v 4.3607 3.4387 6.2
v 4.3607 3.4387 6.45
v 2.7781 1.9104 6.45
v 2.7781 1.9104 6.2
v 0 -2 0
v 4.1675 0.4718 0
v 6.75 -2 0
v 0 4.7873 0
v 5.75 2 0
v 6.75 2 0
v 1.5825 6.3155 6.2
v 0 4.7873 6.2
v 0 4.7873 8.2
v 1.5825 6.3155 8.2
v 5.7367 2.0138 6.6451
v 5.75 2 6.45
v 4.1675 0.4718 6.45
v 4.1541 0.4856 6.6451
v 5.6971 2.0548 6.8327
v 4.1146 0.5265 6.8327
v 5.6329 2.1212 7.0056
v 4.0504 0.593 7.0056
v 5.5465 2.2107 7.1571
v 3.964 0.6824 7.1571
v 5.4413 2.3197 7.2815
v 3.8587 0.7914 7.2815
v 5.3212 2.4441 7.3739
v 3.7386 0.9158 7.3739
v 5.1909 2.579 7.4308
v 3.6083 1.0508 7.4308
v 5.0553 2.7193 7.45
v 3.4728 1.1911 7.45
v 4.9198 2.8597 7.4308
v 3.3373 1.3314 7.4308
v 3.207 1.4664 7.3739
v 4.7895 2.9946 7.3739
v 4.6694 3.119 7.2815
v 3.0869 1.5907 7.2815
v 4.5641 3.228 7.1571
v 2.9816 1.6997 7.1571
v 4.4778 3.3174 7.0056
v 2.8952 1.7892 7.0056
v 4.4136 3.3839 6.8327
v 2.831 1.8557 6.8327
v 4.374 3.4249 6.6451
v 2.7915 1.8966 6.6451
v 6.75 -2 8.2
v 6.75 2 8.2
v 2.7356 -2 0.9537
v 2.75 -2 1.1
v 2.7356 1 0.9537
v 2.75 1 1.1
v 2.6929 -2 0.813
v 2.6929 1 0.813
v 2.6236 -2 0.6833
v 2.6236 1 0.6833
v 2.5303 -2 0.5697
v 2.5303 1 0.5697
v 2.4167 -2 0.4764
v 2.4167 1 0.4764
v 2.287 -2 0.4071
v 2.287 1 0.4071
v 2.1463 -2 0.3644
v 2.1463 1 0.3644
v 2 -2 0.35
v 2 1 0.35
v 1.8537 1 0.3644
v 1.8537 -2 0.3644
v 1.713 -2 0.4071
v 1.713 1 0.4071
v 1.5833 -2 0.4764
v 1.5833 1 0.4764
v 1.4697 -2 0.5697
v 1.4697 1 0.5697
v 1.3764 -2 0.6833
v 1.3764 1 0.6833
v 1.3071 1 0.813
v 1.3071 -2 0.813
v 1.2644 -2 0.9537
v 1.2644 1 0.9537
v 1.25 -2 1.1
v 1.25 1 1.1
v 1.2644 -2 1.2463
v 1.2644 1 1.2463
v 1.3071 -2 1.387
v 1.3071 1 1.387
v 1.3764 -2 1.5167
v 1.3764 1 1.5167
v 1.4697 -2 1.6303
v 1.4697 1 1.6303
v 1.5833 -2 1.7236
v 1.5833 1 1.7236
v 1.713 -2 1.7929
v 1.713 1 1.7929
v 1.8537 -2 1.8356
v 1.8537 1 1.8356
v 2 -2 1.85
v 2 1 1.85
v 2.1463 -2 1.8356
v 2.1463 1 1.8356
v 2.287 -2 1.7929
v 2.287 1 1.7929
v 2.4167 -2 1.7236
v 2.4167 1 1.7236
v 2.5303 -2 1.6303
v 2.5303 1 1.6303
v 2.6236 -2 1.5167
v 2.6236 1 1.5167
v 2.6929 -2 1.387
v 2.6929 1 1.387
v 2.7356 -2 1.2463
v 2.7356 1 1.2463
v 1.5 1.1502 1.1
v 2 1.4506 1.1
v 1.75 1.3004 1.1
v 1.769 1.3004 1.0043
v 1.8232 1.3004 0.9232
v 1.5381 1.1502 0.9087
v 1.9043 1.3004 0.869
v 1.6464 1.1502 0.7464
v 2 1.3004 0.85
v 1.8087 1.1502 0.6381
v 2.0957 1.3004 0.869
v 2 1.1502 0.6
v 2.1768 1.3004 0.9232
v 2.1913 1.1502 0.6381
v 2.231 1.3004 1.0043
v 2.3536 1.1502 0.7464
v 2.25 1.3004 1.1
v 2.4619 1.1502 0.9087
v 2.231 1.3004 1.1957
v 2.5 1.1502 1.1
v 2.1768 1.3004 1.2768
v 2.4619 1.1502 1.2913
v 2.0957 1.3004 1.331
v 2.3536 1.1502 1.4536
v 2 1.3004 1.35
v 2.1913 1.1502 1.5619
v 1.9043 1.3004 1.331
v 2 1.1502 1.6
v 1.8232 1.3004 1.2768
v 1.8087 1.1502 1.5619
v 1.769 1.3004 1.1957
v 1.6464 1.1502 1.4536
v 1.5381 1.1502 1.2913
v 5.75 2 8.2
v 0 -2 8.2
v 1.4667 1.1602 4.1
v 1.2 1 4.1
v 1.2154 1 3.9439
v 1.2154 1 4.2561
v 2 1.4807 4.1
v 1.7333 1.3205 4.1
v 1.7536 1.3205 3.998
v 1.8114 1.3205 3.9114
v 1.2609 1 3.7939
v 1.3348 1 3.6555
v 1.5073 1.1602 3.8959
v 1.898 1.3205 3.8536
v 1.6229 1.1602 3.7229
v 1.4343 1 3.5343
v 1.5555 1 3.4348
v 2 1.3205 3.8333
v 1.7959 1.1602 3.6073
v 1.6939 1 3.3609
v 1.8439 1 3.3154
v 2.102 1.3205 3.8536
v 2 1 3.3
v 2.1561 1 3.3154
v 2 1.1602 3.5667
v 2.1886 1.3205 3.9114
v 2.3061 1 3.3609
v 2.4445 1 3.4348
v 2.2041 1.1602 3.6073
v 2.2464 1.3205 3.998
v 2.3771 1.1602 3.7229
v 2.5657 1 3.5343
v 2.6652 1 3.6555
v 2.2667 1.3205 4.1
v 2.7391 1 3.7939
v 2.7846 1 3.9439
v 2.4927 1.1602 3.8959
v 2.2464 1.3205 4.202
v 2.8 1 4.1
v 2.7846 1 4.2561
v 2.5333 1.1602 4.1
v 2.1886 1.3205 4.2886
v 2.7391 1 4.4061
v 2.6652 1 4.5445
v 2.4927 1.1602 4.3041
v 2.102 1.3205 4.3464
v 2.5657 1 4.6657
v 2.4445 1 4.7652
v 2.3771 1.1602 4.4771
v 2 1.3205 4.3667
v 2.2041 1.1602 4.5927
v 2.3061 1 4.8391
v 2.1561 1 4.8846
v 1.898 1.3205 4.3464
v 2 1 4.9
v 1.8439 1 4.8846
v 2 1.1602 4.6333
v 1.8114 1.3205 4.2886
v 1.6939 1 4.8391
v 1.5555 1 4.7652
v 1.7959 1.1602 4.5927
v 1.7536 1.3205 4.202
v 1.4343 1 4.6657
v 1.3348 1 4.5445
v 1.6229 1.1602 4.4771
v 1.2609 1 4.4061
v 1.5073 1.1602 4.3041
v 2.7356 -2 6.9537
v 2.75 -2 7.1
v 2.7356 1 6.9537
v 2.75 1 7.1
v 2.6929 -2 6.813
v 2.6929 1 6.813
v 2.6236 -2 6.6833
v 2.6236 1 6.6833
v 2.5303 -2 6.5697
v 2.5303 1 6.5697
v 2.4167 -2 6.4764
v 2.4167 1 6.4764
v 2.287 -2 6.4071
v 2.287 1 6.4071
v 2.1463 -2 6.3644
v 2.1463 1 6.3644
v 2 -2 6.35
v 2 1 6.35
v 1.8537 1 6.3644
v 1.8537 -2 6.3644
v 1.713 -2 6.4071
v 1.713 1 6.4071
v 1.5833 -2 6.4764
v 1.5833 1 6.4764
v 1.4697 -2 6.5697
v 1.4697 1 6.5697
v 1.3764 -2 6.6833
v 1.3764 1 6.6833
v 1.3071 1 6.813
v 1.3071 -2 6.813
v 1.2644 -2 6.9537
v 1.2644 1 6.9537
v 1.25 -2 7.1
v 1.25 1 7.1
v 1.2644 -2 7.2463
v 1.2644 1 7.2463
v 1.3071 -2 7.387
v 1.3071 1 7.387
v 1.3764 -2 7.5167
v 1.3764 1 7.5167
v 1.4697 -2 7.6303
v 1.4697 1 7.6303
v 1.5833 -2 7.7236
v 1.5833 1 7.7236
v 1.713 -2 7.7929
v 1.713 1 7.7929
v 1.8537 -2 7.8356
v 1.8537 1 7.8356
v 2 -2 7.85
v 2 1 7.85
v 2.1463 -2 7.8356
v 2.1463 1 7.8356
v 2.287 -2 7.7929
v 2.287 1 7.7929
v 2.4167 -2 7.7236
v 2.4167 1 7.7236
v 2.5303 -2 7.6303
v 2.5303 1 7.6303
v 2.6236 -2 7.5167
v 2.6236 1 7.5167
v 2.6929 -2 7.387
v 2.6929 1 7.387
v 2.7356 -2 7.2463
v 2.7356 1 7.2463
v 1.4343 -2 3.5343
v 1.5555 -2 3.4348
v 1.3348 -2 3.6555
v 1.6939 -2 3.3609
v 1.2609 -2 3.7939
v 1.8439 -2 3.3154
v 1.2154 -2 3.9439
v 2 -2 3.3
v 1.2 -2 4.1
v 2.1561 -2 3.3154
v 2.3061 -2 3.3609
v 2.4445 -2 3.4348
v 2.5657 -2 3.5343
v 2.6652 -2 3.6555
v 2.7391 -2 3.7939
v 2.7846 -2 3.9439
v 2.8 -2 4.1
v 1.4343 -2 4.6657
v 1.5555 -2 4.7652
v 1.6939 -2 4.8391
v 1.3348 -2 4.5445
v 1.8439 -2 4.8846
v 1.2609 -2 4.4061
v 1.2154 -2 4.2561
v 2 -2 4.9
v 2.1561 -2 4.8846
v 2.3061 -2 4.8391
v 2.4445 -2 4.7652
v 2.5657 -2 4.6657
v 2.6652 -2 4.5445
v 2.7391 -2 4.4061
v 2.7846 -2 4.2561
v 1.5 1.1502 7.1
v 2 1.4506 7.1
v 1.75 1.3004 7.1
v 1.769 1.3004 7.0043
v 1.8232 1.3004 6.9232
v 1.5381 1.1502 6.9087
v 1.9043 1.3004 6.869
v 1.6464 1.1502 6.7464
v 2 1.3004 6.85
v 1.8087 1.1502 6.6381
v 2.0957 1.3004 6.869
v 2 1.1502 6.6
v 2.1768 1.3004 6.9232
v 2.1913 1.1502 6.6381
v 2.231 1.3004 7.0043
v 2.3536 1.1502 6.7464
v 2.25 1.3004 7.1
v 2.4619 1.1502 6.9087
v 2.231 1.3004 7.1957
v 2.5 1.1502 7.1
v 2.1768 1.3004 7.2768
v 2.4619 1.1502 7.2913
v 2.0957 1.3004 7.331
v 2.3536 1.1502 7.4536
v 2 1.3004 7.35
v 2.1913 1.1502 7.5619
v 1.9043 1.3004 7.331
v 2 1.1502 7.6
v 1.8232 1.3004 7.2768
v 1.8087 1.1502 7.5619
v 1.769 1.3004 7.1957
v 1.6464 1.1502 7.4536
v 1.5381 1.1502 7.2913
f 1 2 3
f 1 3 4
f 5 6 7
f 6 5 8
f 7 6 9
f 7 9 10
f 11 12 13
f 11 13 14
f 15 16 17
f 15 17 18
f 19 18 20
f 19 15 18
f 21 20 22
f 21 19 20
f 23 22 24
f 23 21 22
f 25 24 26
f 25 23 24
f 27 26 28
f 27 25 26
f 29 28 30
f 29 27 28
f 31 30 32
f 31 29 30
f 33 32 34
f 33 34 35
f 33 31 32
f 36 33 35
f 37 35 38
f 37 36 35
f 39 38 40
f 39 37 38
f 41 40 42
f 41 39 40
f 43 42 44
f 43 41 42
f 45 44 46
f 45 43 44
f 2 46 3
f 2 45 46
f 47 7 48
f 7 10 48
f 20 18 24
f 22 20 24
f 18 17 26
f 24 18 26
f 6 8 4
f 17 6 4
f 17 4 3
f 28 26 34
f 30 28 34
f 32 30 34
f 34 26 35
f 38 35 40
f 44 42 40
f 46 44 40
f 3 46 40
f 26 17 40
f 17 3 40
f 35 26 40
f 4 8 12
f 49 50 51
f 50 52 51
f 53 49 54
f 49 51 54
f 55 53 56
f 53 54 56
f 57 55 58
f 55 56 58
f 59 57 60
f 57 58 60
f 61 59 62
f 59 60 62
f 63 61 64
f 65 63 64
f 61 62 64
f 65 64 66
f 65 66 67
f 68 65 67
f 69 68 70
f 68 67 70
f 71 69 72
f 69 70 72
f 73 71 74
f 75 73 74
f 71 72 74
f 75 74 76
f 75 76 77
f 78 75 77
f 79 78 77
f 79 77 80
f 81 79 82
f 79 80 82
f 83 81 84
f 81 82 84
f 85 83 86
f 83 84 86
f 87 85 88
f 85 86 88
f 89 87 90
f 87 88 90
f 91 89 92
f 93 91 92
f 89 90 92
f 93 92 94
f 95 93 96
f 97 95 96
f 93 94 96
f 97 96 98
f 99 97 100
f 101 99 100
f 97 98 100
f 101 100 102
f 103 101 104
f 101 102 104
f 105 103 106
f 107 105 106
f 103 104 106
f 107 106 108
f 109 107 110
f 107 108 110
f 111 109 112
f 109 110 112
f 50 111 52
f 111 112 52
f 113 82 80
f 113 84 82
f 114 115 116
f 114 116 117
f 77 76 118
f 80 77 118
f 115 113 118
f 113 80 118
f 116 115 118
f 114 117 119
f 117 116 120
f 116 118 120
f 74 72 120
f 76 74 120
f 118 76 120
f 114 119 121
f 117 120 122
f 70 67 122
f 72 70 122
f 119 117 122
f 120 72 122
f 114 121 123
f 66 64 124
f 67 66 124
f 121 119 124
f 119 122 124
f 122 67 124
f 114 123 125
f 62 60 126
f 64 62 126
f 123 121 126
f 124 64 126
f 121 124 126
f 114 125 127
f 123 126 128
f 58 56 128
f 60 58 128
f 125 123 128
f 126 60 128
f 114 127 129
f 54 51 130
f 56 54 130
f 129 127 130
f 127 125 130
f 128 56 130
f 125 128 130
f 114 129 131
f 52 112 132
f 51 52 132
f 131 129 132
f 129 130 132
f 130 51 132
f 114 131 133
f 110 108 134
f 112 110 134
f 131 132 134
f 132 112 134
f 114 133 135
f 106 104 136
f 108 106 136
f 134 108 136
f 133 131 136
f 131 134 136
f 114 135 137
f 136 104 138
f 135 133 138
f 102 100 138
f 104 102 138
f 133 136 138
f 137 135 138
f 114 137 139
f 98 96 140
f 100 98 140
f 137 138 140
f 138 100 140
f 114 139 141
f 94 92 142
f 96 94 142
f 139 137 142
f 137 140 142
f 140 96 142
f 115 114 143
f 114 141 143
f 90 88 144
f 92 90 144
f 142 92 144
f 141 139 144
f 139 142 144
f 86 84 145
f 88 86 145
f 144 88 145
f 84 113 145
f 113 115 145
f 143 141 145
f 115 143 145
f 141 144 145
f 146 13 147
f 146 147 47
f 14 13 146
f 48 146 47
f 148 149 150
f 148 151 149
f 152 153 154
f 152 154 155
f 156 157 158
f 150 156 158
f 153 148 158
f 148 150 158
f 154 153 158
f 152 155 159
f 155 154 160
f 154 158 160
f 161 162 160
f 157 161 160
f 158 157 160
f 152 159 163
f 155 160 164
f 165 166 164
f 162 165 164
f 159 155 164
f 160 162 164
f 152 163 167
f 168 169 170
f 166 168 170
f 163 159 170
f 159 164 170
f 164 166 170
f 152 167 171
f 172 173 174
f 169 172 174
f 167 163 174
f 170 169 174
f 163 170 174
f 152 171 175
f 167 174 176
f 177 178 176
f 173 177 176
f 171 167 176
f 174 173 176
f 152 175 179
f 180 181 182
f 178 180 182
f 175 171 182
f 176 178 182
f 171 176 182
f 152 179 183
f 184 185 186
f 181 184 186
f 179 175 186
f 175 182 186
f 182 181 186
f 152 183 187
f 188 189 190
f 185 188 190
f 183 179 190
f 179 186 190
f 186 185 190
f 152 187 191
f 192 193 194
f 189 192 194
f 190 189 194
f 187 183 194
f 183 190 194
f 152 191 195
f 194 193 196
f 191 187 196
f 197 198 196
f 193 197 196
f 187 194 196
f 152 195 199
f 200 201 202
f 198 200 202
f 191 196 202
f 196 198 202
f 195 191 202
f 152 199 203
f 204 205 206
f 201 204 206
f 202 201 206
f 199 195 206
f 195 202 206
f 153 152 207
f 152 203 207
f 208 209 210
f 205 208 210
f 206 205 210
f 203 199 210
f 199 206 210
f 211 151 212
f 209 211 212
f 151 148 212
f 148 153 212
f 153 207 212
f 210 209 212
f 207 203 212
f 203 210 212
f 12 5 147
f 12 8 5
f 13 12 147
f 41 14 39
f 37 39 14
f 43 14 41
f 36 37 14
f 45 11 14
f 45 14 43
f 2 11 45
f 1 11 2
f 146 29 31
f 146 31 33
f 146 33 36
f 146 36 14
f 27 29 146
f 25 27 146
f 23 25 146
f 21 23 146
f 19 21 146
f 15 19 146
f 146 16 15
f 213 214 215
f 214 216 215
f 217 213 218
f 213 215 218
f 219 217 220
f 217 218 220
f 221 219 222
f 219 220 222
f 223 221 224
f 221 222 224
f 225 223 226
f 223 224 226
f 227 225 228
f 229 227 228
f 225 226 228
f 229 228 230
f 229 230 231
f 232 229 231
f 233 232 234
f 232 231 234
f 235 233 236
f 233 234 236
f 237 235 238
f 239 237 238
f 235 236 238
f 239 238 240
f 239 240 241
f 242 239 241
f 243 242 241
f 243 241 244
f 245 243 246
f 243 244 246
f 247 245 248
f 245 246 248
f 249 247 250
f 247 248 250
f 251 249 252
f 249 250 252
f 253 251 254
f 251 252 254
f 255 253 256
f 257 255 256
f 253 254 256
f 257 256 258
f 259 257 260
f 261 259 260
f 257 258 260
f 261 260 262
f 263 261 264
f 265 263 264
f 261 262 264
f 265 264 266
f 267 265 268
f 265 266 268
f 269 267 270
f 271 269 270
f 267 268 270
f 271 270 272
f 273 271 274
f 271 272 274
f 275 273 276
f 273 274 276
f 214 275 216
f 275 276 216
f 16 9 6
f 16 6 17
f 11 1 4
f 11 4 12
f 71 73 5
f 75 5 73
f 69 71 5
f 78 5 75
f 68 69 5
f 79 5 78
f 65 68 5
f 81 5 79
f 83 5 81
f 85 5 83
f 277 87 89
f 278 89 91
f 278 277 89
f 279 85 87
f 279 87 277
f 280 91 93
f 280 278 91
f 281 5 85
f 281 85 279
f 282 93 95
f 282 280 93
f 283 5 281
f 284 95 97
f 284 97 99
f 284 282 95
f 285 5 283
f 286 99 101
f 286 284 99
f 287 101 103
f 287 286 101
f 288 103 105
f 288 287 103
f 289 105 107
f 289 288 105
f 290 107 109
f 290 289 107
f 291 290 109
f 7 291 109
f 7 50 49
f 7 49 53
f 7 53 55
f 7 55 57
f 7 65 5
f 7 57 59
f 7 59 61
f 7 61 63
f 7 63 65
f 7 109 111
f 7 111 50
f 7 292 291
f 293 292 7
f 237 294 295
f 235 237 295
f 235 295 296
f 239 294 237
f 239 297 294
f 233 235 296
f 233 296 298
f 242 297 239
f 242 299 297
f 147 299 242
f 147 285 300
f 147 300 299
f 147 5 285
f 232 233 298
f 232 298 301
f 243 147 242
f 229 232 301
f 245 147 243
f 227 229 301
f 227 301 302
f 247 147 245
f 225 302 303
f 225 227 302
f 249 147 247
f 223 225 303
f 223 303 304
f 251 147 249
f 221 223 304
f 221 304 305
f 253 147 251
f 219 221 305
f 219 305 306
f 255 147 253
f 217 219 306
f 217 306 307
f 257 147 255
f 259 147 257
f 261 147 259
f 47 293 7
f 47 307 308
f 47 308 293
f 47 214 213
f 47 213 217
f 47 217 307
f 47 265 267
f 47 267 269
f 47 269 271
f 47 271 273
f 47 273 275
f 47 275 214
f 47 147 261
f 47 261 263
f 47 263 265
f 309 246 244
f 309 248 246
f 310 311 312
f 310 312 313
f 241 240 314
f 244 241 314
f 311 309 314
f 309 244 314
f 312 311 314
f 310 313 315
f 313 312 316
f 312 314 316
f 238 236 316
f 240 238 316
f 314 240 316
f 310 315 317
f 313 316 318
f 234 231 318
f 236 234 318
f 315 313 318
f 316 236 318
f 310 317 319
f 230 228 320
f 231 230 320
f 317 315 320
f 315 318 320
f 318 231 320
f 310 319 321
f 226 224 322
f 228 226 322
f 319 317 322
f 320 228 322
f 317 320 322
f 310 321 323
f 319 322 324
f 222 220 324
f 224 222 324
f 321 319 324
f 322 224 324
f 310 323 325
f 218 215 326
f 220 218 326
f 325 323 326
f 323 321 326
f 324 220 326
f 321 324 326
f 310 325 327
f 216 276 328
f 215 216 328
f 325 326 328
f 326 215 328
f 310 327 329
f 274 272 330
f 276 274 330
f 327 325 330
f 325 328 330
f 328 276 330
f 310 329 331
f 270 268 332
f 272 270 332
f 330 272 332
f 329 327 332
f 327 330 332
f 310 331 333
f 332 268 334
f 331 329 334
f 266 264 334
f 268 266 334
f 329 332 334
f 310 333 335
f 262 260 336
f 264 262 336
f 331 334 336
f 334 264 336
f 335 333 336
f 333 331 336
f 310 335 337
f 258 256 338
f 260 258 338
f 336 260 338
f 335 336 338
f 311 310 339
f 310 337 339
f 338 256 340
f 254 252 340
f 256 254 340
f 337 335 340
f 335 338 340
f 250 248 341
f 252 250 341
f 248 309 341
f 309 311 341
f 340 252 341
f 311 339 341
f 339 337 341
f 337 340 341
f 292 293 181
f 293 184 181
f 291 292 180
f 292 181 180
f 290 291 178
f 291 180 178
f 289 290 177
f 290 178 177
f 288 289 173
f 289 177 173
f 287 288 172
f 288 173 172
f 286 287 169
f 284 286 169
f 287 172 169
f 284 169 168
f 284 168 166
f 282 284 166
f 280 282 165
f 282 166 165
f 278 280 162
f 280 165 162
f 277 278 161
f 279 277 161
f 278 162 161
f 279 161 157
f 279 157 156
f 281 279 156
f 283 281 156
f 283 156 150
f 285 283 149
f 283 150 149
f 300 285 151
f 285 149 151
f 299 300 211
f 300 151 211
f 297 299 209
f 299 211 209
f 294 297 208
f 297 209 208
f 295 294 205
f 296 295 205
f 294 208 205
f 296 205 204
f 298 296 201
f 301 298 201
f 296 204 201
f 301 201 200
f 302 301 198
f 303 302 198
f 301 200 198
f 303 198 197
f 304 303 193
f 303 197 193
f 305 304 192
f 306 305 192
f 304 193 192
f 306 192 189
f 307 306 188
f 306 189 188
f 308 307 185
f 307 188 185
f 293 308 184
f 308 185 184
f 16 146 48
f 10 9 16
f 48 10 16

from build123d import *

# Parameters (mm, degrees)
BOSS_EXTRUDE1_DEPTH       = 8.2
CUT_EXTRUDE1_DEPTH        = 2.2
SKETCH3_W                 = 6.75
SKETCH3_H                 = 8.2
BOSS_EXTRUDE2_DEPTH       = 2
F_1_5MM_DOWEL_HOLE1_D     = 1.5
F_1_5MM_DOWEL_HOLE1_DEPTH = 3
F_1_5MM_DOWEL_HOLE1_TIP   = 0.450645464
M2X0_4_TAPPED_HOLE1_D     = 1.6
M2X0_4_TAPPED_HOLE1_DEPTH = 3
M2X0_4_TAPPED_HOLE1_TIP   = 0.480688495


with BuildPart() as part:
    # Sketch1 → Boss-Extrude1 (new body)
    with BuildSketch(Plane.XY):
        Polygon((0, 0), (0, 4.787274917), (1.582547561, 6.315523332), (5.75, 2), (6.75, 2), (6.75, 0), align=None)
    extrude(amount=BOSS_EXTRUDE1_DEPTH)

    # Sketch2 → Cut-Extrude1 (cut)
    with BuildSketch(Plane(origin=(3.97472688, 3.838349131, 0), x_dir=(0, 0, -1), z_dir=(0.7193398, 0.69465837, 0))):
        with BuildLine():
            Line((0, 3.443677383), (0, -2.555606029))
            Line((0, -2.555606029), (-6.45, -2.555606029))
            ThreePointArc((-6.45, -2.555606029), (-7.45, -1.555606029), (-6.45, -0.555606029))
            Line((-6.45, -0.555606029), (-6.2, -0.555606029))
            Line((-6.2, -0.555606029), (-6.2, 3.443677383))
            Line((-6.2, 3.443677383), (0, 3.443677383))
        make_face()
    extrude(amount=-CUT_EXTRUDE1_DEPTH, mode=Mode.SUBTRACT)

    # Sketch3 → Boss-Extrude2 (add)
    with BuildSketch(Plane.XZ):
        with Locations((3.375, 4.1)):
            Rectangle(SKETCH3_W, SKETCH3_H)
    extrude(amount=BOSS_EXTRUDE2_DEPTH)

    # Ø1.5mm Dowel Hole1
    with Locations(Plane(origin=(0, -2, 0), x_dir=(-1, 0, 0), z_dir=(0, -1, 0))):
        with Locations((-2, -7.1), (-2, -1.1)):
            Hole(F_1_5MM_DOWEL_HOLE1_D / 2, depth=F_1_5MM_DOWEL_HOLE1_DEPTH)
            with Locations((0, 0, -(F_1_5MM_DOWEL_HOLE1_DEPTH + F_1_5MM_DOWEL_HOLE1_TIP / 2))):  # 118° drill point
                Cone(0, F_1_5MM_DOWEL_HOLE1_D / 2, F_1_5MM_DOWEL_HOLE1_TIP, mode=Mode.SUBTRACT)

    # M2x0.4 Tapped Hole1
    with Locations(Plane(origin=(0, -2, 0), x_dir=(-1, 0, 0), z_dir=(0, -1, 0))):
        with Locations((-2, -4.1)):
            Hole(M2X0_4_TAPPED_HOLE1_D / 2, depth=M2X0_4_TAPPED_HOLE1_DEPTH)
            with Locations((0, 0, -(M2X0_4_TAPPED_HOLE1_DEPTH + M2X0_4_TAPPED_HOLE1_TIP / 2))):  # 118° drill point
                Cone(0, M2X0_4_TAPPED_HOLE1_D / 2, M2X0_4_TAPPED_HOLE1_TIP, mode=Mode.SUBTRACT)


solid = part.part
